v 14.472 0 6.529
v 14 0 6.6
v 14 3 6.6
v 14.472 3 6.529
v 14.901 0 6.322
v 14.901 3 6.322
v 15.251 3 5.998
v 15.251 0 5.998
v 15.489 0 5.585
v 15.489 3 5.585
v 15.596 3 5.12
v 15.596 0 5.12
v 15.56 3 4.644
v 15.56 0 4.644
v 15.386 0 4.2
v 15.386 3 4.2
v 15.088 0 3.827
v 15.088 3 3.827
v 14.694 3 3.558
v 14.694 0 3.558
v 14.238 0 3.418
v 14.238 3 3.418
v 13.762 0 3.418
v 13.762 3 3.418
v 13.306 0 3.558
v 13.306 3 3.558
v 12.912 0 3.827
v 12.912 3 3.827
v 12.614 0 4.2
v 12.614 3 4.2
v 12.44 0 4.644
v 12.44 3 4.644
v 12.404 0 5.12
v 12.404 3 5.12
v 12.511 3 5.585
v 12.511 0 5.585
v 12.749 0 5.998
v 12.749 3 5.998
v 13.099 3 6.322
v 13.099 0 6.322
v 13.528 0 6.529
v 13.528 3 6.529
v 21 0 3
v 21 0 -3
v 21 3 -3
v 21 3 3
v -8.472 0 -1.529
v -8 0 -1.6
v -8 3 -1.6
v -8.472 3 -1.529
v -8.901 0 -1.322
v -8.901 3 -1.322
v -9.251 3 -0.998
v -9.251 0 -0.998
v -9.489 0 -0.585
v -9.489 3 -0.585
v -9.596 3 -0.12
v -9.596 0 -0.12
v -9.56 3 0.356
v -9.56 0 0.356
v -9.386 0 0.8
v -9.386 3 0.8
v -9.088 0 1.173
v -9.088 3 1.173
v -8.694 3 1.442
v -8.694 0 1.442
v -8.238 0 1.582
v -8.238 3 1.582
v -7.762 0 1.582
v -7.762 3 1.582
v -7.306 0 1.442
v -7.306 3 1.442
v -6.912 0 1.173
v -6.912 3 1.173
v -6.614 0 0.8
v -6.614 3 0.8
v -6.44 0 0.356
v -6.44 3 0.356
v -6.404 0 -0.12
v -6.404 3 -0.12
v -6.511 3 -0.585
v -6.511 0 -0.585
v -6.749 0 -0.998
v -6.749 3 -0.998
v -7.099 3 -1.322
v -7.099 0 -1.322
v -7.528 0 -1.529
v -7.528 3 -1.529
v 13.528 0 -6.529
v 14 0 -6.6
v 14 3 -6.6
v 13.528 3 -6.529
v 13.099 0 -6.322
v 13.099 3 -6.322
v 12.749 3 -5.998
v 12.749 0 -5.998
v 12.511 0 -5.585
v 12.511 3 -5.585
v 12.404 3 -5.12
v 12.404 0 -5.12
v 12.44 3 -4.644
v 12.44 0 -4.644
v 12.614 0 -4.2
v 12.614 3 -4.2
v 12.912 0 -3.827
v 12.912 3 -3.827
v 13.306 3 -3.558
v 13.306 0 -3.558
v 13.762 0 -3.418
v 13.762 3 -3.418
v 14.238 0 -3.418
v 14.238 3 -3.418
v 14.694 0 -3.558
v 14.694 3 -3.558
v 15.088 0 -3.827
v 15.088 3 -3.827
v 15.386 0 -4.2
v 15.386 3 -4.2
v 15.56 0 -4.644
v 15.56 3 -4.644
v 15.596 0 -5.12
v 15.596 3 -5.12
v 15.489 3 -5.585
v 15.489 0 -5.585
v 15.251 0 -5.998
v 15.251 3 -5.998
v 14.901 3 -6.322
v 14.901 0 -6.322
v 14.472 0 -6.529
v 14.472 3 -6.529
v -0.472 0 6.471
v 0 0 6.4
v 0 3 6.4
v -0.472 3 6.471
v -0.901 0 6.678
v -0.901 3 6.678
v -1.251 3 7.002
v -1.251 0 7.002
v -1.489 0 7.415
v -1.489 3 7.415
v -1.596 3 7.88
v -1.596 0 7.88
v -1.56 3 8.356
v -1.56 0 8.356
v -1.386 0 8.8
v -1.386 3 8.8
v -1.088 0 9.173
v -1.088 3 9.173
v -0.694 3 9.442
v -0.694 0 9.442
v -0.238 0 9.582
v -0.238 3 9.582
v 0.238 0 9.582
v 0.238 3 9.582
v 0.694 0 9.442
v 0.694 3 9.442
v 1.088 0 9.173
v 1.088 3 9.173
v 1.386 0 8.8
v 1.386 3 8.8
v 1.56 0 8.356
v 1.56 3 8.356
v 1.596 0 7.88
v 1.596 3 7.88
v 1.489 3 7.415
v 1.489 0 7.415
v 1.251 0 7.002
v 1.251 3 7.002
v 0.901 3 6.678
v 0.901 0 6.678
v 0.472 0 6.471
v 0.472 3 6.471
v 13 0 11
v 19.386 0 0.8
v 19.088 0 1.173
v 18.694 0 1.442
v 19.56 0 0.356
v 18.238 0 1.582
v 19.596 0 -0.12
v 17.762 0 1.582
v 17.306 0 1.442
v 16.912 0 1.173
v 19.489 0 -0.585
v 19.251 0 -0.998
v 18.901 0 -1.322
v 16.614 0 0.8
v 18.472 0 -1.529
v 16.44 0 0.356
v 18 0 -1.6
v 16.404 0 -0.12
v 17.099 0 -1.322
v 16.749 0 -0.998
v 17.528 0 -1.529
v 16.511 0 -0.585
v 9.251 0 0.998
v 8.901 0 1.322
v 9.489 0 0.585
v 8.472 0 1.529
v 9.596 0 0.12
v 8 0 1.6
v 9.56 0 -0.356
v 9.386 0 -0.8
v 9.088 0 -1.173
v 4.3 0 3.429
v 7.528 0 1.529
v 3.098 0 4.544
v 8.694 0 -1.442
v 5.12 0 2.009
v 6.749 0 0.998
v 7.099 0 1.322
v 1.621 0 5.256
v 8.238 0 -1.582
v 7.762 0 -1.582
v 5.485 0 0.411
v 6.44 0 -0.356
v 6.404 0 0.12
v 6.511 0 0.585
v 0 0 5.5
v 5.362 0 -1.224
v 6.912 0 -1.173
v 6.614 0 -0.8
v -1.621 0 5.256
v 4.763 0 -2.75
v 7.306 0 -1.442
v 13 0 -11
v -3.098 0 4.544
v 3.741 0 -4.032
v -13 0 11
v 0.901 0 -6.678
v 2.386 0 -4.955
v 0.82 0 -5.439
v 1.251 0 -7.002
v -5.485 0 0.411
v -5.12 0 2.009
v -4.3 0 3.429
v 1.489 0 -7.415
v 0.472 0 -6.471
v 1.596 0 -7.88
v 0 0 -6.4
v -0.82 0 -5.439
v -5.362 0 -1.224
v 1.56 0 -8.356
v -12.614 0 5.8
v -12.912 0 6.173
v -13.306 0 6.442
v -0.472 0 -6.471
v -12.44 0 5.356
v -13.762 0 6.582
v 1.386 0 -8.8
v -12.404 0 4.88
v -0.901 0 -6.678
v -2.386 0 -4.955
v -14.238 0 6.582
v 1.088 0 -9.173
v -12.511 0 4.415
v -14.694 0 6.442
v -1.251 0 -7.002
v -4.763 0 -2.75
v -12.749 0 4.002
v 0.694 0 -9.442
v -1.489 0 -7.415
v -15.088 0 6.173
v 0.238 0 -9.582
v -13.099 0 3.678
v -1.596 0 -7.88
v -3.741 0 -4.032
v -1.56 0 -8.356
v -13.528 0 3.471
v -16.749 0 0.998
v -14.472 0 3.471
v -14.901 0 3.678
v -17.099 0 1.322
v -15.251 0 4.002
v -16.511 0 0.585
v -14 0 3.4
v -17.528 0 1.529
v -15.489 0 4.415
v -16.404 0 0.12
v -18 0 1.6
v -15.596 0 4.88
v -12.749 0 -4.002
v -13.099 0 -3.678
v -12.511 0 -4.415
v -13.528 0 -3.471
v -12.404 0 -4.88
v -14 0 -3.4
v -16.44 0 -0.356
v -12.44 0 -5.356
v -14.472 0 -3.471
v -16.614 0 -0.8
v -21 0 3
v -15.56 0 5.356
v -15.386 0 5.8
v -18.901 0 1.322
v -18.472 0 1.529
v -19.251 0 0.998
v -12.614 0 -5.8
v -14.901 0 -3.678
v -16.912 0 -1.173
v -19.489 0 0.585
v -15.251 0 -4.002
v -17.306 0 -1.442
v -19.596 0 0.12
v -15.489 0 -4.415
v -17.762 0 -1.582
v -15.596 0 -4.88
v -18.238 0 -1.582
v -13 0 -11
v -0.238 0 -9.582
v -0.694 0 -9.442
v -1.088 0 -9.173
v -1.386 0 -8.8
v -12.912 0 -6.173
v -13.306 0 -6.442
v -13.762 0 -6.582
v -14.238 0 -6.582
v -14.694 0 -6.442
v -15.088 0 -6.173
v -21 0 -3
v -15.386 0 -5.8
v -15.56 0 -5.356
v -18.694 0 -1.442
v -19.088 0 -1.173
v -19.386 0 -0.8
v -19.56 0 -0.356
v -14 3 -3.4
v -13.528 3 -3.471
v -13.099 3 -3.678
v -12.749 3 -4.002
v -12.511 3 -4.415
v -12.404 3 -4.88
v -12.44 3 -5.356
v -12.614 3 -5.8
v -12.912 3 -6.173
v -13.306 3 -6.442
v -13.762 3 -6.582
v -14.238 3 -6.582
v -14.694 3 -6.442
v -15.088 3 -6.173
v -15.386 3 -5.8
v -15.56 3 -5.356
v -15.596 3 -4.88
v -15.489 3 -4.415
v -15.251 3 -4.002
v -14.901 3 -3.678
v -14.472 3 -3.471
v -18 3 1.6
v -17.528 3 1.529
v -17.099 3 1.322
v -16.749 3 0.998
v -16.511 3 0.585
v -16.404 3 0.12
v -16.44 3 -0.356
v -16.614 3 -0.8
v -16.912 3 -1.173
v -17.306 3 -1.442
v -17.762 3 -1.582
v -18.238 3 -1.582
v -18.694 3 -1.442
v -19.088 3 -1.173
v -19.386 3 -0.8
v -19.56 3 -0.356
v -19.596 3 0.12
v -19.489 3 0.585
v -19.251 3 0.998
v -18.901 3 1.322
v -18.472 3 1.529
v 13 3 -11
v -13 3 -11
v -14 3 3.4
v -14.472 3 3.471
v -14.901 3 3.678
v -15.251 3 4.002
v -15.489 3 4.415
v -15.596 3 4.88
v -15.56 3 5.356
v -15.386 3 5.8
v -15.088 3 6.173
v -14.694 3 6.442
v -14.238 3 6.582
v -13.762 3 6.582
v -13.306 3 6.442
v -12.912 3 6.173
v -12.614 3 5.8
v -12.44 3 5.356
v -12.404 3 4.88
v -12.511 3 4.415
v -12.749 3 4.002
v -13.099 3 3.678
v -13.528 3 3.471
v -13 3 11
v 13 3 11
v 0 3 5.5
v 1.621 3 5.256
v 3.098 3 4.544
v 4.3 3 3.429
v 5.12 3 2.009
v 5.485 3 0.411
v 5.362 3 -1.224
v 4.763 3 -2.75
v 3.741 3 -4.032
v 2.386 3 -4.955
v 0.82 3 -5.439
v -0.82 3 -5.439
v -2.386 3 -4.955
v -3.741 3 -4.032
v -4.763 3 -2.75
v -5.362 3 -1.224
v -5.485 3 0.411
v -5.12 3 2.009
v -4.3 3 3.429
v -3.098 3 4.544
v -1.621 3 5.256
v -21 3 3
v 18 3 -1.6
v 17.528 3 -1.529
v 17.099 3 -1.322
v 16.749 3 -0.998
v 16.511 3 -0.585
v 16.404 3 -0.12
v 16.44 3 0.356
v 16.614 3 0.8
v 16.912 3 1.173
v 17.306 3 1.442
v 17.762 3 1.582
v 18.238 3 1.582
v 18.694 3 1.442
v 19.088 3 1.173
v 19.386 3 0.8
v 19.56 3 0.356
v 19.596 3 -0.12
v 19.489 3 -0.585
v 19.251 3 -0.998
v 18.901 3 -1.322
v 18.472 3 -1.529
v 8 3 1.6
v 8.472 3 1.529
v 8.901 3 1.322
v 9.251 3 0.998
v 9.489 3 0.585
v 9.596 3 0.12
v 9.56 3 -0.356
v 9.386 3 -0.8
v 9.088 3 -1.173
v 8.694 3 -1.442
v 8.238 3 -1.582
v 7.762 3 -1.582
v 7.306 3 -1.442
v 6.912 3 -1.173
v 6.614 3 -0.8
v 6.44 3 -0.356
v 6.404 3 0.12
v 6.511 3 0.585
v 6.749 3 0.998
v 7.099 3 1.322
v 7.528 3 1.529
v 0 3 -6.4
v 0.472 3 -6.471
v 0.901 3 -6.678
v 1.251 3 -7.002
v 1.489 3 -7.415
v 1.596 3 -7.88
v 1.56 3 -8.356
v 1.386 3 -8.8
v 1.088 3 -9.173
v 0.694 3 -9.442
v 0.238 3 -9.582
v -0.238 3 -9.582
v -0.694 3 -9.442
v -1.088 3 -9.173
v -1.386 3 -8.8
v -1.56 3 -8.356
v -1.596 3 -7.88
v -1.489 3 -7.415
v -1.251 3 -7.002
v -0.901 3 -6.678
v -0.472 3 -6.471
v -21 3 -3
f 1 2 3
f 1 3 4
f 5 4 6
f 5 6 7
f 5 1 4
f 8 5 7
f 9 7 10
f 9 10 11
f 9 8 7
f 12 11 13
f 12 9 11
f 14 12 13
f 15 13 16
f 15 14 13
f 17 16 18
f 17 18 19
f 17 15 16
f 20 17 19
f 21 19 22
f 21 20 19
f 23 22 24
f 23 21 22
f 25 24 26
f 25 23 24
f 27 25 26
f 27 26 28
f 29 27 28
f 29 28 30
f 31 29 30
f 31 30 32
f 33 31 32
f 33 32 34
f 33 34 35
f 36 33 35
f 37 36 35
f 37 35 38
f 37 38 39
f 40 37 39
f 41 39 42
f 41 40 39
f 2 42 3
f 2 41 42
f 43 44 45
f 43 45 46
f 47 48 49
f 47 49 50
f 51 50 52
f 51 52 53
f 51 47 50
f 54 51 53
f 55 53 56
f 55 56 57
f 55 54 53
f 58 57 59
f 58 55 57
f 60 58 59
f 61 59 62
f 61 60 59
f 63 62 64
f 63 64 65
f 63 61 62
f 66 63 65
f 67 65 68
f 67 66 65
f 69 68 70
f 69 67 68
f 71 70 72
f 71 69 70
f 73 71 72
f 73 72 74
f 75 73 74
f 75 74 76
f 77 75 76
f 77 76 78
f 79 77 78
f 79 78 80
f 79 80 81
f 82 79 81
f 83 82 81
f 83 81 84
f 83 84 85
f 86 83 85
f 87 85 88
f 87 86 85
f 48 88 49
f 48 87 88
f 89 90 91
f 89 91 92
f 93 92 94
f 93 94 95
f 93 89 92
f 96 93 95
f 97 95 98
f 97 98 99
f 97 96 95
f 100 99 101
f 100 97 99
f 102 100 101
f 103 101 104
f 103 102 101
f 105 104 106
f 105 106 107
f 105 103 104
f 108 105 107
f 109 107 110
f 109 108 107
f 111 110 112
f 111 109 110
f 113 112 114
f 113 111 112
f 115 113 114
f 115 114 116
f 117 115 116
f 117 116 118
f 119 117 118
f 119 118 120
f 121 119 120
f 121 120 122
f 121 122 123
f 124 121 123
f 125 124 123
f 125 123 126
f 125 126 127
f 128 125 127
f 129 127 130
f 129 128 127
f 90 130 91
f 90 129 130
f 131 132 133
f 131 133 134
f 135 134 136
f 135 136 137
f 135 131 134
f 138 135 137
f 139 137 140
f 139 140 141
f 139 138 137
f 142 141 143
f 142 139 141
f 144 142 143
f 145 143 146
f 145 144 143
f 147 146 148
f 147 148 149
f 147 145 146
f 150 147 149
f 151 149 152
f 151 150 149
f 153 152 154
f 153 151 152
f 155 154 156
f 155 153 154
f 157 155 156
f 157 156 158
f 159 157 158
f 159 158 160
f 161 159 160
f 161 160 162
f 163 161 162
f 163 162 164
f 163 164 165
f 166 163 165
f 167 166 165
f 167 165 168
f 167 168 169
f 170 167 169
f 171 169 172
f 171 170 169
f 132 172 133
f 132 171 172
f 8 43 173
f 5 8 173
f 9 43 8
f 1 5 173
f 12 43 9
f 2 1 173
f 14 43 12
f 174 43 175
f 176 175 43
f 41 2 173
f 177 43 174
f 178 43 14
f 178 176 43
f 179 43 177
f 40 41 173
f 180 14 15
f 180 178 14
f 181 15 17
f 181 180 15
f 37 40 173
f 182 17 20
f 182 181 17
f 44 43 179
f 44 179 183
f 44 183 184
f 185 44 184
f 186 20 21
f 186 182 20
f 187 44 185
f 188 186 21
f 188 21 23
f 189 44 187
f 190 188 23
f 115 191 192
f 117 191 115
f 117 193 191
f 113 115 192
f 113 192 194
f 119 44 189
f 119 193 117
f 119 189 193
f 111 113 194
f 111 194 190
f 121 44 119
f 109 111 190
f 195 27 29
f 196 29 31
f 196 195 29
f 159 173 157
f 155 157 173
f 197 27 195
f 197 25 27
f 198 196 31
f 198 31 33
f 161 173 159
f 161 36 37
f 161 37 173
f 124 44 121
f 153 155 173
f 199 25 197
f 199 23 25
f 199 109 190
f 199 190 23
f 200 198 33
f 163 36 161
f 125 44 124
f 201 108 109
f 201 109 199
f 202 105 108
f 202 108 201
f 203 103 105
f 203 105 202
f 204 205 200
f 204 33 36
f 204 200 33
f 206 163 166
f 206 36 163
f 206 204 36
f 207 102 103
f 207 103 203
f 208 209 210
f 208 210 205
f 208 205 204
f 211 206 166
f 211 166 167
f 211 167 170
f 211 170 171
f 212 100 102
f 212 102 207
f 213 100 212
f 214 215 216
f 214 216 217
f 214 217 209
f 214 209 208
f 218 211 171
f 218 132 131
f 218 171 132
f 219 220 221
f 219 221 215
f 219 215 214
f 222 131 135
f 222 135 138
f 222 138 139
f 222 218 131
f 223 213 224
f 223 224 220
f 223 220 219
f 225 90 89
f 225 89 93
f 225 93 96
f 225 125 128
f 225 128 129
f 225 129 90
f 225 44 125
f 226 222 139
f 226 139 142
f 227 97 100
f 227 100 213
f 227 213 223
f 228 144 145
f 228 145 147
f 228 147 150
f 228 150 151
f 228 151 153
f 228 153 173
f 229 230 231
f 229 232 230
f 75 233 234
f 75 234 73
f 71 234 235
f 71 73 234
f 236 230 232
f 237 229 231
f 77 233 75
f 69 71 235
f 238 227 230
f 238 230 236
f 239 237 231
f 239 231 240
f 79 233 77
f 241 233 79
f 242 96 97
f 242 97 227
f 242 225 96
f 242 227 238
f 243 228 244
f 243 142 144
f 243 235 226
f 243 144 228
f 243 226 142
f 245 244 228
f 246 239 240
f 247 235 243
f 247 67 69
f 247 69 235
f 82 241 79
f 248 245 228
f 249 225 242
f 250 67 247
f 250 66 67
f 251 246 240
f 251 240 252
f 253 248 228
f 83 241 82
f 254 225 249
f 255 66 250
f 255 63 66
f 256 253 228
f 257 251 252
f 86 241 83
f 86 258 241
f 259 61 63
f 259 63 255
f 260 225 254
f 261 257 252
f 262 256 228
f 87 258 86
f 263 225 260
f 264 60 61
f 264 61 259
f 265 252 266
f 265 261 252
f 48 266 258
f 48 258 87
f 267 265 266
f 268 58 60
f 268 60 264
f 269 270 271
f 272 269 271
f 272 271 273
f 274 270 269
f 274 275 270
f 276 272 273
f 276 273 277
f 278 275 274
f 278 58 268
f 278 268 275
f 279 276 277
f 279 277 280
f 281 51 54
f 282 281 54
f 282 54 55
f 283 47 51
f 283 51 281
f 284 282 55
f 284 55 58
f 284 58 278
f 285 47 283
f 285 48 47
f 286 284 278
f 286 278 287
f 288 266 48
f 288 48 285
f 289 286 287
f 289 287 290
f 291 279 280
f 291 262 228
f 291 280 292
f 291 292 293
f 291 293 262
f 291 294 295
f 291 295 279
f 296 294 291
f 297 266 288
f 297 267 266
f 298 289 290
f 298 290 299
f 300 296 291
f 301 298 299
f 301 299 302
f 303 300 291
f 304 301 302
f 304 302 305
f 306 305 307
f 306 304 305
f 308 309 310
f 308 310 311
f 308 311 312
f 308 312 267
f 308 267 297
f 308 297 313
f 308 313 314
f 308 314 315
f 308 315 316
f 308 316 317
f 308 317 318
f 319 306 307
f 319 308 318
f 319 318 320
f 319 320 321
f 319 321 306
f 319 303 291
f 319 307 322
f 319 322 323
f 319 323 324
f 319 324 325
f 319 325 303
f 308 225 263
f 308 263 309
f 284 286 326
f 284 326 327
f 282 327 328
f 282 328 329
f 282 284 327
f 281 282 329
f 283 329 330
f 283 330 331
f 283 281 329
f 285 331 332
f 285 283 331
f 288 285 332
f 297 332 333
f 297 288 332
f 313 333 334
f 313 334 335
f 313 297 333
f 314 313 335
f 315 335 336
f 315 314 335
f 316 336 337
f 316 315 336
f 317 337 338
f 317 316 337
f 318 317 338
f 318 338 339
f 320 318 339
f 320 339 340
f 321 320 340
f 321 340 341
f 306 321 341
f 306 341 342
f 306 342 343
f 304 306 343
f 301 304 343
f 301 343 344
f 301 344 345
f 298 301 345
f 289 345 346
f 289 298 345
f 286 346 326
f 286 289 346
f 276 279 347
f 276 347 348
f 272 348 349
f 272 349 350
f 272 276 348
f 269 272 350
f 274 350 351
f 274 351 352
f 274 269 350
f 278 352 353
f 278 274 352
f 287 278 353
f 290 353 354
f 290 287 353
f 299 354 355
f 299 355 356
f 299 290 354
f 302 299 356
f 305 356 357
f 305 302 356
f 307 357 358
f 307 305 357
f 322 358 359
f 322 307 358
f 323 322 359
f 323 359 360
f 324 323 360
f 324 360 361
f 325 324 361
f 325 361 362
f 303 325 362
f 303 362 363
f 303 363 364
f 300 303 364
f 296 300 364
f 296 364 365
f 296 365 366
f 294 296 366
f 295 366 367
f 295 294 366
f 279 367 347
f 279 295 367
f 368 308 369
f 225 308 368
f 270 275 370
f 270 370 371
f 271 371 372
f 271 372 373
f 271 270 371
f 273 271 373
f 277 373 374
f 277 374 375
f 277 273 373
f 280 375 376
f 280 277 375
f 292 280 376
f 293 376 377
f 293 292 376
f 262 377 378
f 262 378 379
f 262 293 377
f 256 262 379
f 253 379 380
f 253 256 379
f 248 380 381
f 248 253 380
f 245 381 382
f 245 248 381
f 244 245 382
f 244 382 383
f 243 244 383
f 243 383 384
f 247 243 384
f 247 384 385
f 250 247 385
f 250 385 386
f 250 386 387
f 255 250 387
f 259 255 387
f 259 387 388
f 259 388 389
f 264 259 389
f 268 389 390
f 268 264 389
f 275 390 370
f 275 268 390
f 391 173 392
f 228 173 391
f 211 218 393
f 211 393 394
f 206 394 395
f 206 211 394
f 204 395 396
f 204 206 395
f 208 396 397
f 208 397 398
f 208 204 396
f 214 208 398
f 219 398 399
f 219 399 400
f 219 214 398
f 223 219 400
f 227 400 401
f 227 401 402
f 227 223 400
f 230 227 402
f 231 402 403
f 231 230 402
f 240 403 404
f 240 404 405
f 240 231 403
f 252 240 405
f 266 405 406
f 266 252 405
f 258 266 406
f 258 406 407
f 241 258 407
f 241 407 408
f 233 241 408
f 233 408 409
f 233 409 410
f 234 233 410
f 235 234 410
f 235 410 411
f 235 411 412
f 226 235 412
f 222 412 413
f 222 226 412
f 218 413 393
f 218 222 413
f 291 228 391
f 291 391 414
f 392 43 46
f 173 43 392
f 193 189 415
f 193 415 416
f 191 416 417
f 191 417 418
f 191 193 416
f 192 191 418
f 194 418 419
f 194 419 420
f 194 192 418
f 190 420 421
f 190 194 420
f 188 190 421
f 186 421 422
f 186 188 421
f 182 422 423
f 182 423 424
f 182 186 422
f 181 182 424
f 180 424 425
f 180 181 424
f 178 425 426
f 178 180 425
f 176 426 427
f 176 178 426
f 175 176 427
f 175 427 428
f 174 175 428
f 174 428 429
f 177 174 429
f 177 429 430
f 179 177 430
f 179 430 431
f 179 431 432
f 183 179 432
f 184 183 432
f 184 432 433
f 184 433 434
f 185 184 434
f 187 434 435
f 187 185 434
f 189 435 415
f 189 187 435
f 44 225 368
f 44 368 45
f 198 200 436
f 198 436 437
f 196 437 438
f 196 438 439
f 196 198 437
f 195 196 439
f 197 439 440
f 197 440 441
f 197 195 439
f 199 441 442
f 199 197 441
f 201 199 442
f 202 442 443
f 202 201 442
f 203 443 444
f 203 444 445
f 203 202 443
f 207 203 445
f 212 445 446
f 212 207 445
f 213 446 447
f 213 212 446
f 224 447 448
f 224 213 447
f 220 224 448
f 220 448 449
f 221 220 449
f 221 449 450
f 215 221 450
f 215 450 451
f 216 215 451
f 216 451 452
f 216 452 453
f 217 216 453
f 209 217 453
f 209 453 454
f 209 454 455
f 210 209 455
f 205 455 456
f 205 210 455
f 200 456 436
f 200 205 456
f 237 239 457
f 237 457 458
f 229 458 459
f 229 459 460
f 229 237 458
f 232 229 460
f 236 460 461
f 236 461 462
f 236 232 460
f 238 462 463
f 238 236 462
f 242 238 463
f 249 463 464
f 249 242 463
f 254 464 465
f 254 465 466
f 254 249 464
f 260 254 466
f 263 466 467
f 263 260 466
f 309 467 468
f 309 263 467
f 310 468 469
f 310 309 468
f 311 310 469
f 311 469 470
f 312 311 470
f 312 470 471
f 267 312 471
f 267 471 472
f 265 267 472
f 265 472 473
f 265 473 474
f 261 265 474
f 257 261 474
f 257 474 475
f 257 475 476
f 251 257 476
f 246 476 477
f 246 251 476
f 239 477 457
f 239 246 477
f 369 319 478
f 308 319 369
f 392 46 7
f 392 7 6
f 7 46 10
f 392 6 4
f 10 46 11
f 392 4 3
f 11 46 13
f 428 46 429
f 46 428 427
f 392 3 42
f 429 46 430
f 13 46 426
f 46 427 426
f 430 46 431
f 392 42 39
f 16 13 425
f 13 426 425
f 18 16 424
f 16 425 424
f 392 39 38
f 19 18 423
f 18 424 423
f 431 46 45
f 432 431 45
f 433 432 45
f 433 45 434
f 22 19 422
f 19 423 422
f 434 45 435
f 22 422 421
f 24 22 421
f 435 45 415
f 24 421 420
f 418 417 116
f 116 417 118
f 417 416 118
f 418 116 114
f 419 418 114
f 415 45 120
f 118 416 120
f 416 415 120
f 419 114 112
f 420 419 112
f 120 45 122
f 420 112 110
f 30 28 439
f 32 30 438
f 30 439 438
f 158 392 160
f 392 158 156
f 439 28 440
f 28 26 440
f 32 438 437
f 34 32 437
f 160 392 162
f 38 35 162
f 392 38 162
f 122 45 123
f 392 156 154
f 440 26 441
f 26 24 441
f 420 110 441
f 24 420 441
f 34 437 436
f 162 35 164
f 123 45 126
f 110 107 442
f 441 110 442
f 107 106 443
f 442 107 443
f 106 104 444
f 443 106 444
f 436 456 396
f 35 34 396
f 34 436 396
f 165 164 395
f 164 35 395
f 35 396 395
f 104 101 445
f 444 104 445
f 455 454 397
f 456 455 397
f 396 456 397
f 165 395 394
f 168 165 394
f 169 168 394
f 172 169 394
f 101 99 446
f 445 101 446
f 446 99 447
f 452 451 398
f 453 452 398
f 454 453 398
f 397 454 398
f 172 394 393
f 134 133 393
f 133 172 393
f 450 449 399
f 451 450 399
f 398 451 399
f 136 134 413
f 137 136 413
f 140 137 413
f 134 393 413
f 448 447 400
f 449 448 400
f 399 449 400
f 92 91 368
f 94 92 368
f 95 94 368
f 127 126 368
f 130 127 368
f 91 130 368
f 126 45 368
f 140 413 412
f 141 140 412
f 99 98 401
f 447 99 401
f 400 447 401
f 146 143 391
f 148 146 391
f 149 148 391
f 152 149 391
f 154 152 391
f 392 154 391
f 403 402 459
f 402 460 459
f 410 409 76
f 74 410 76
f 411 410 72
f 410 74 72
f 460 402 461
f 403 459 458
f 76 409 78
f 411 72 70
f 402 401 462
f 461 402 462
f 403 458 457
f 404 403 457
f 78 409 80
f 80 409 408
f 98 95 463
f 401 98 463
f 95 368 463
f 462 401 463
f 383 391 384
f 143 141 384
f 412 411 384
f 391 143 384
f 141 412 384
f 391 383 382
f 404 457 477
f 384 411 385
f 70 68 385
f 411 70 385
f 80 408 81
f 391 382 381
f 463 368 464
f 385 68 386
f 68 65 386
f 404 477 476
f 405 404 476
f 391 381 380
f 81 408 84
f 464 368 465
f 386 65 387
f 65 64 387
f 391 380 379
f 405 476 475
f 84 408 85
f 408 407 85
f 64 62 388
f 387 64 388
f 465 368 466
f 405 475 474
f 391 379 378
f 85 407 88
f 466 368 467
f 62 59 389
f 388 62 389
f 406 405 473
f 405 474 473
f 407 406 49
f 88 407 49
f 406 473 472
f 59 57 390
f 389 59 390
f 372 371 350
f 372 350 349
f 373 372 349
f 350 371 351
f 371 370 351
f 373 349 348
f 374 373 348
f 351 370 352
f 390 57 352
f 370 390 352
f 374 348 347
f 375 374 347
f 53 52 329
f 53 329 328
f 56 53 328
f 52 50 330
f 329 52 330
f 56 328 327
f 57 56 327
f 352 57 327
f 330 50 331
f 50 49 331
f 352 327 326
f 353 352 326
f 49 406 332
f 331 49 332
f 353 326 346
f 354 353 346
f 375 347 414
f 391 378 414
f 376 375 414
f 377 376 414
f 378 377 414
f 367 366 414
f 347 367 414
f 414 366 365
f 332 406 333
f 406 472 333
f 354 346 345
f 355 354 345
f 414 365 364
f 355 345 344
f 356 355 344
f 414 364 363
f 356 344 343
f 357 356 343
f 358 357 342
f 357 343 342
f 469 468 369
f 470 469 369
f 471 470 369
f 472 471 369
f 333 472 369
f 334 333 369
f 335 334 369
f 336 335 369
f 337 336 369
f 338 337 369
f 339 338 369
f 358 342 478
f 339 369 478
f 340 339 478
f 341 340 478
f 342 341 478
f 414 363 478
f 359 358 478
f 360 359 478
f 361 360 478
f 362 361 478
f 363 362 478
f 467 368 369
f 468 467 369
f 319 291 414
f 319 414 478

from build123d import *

# Parameters (mm, degrees)
SKETCH_1_R      = 1.6
SKETCH_1_R_2    = 5.5
EXTRUDE_1_DEPTH = 3


with BuildPart() as part:
    # 草图1 → 凸台-拉伸1 (new body)
    with BuildSketch(Plane(origin=(0, 0, 0), x_dir=(1, 0, 0), z_dir=(0, 1, 0))):
        Polygon((-21, 3), (-13, 11), (13, 11), (21, 3), (21, -3), (13, -11), (-13, -11), (-21, -3), align=None)
        with Locations(Location((0, 8, 0), (0, 0, 270))):
            Circle(SKETCH_1_R, mode=Mode.SUBTRACT)
        with Locations(Location((8, 0, 0), (0, 0, 270))):
            Circle(SKETCH_1_R, mode=Mode.SUBTRACT)
        with Locations(Location((-8, 0, 0), (0, 0, 90))):
            Circle(SKETCH_1_R, mode=Mode.SUBTRACT)
        with Locations(Location((0, 0, 0), (0, 0, 270))):
            Circle(SKETCH_1_R_2, mode=Mode.SUBTRACT)
        with Locations(Location((0, -8, 0), (0, 0, 90))):
            Circle(SKETCH_1_R, mode=Mode.SUBTRACT)
        with Locations(Location((-18, 0, 0), (0, 0, 270))):
            Circle(SKETCH_1_R, mode=Mode.SUBTRACT)
        with Locations(Location((-14, 5, 0), (0, 0, 270))):
            Circle(SKETCH_1_R, mode=Mode.SUBTRACT)
        with Locations(Location((-14, -5, 0), (0, 0, 90))):
            Circle(SKETCH_1_R, mode=Mode.SUBTRACT)
        with Locations(Location((14, -5, 0), (0, 0, 270))):
            Circle(SKETCH_1_R, mode=Mode.SUBTRACT)
        with Locations(Location((18, 0, 0), (0, 0, 90))):
            Circle(SKETCH_1_R, mode=Mode.SUBTRACT)
        with Locations(Location((14, 5, 0), (0, 0, 90))):
            Circle(SKETCH_1_R, mode=Mode.SUBTRACT)
    extrude(amount=EXTRUDE_1_DEPTH)


solid = part.part
